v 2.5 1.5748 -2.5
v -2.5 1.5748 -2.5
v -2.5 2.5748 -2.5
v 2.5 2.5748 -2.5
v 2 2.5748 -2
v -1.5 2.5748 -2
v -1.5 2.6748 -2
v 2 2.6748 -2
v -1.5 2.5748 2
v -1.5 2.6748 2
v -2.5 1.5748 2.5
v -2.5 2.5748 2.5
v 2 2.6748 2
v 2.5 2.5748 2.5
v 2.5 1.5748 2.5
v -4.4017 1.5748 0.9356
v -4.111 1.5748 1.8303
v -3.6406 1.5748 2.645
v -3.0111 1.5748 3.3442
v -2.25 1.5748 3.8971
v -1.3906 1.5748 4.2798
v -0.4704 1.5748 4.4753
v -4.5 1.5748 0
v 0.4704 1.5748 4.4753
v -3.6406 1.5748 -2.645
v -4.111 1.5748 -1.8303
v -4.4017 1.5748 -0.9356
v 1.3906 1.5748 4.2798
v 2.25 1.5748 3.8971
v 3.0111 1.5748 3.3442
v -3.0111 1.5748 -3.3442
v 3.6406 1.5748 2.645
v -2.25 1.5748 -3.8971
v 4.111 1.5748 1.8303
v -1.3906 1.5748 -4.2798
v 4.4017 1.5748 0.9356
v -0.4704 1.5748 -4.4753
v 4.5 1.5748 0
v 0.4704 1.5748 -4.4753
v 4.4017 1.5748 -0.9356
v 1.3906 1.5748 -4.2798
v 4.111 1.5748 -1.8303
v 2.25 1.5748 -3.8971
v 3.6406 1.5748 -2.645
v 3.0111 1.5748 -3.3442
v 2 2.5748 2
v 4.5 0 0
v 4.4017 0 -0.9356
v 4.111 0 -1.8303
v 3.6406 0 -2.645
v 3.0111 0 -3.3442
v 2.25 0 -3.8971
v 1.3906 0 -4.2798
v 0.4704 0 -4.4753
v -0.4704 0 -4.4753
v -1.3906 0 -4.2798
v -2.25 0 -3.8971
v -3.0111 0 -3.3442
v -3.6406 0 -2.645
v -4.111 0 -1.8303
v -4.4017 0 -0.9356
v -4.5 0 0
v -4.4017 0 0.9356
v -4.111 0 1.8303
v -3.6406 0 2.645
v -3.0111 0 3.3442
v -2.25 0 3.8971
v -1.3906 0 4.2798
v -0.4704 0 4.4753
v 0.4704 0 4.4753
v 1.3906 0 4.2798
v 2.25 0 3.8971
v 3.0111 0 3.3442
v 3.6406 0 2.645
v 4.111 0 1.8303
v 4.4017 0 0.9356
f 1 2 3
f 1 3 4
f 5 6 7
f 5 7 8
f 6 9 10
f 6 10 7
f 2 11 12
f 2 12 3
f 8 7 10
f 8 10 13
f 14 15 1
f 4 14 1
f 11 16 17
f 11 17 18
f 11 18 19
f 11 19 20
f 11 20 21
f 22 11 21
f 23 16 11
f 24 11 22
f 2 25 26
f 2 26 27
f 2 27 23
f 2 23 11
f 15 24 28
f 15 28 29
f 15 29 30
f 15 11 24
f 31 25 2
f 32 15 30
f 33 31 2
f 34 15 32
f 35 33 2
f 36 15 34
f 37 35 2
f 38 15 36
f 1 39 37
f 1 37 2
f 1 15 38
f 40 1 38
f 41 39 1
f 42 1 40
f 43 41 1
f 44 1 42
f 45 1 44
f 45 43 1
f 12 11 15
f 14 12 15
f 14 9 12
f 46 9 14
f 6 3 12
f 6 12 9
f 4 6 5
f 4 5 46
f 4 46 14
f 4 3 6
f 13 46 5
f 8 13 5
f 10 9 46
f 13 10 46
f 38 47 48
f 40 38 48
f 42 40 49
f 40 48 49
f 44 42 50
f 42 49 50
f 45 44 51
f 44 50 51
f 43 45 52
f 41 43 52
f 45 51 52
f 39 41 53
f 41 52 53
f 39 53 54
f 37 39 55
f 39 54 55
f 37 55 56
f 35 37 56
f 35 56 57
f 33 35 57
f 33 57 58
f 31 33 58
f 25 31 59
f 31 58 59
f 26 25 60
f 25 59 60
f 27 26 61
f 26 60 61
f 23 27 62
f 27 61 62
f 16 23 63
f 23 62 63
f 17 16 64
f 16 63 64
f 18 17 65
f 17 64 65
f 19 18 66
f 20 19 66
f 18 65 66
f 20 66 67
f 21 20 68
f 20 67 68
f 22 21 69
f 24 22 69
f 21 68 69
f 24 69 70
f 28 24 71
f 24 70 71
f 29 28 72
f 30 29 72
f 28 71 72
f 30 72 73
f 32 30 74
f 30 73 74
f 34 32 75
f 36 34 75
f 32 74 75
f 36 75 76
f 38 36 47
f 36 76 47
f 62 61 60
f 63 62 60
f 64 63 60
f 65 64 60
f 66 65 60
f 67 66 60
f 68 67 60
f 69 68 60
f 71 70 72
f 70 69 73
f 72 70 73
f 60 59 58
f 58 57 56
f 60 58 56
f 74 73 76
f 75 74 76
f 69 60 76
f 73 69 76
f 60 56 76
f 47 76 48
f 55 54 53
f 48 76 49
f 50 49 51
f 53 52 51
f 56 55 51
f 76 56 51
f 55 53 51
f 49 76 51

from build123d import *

# Parameters (mm, degrees)
SKETCH1_R           = 4.5
BOSS_EXTRUDE1_DEPTH = 1.5748
SKETCH2_W           = 5
SKETCH2_H           = 5
BOSS_EXTRUDE2_DEPTH = 1
SKETCH3_W           = 3.5
SKETCH3_H           = 4
BOSS_EXTRUDE3_DEPTH = 0.1


with BuildPart() as part:
    # Sketch1 → Boss-Extrude1 (new body)
    with BuildSketch(Plane(origin=(0, 0, 0), x_dir=(1, 0, 0), z_dir=(0, 1, 0))):
        Circle(SKETCH1_R)
    extrude(amount=BOSS_EXTRUDE1_DEPTH)

    # Sketch2 → Boss-Extrude2 (add)
    with BuildSketch(Plane(origin=(0, 1.5748, 0), x_dir=(1, 0, 0), z_dir=(0, 1, 0))):
        Rectangle(SKETCH2_W, SKETCH2_H)
    extrude(amount=BOSS_EXTRUDE2_DEPTH)

    # Sketch3 → Boss-Extrude3 (add)
    with BuildSketch(Plane(origin=(0, 2.5748, 0), x_dir=(1, 0, 0), z_dir=(0, 1, 0))):
        with Locations((0.25, 0)):
            Rectangle(SKETCH3_W, SKETCH3_H)
    extrude(amount=BOSS_EXTRUDE3_DEPTH)


solid = part.part
